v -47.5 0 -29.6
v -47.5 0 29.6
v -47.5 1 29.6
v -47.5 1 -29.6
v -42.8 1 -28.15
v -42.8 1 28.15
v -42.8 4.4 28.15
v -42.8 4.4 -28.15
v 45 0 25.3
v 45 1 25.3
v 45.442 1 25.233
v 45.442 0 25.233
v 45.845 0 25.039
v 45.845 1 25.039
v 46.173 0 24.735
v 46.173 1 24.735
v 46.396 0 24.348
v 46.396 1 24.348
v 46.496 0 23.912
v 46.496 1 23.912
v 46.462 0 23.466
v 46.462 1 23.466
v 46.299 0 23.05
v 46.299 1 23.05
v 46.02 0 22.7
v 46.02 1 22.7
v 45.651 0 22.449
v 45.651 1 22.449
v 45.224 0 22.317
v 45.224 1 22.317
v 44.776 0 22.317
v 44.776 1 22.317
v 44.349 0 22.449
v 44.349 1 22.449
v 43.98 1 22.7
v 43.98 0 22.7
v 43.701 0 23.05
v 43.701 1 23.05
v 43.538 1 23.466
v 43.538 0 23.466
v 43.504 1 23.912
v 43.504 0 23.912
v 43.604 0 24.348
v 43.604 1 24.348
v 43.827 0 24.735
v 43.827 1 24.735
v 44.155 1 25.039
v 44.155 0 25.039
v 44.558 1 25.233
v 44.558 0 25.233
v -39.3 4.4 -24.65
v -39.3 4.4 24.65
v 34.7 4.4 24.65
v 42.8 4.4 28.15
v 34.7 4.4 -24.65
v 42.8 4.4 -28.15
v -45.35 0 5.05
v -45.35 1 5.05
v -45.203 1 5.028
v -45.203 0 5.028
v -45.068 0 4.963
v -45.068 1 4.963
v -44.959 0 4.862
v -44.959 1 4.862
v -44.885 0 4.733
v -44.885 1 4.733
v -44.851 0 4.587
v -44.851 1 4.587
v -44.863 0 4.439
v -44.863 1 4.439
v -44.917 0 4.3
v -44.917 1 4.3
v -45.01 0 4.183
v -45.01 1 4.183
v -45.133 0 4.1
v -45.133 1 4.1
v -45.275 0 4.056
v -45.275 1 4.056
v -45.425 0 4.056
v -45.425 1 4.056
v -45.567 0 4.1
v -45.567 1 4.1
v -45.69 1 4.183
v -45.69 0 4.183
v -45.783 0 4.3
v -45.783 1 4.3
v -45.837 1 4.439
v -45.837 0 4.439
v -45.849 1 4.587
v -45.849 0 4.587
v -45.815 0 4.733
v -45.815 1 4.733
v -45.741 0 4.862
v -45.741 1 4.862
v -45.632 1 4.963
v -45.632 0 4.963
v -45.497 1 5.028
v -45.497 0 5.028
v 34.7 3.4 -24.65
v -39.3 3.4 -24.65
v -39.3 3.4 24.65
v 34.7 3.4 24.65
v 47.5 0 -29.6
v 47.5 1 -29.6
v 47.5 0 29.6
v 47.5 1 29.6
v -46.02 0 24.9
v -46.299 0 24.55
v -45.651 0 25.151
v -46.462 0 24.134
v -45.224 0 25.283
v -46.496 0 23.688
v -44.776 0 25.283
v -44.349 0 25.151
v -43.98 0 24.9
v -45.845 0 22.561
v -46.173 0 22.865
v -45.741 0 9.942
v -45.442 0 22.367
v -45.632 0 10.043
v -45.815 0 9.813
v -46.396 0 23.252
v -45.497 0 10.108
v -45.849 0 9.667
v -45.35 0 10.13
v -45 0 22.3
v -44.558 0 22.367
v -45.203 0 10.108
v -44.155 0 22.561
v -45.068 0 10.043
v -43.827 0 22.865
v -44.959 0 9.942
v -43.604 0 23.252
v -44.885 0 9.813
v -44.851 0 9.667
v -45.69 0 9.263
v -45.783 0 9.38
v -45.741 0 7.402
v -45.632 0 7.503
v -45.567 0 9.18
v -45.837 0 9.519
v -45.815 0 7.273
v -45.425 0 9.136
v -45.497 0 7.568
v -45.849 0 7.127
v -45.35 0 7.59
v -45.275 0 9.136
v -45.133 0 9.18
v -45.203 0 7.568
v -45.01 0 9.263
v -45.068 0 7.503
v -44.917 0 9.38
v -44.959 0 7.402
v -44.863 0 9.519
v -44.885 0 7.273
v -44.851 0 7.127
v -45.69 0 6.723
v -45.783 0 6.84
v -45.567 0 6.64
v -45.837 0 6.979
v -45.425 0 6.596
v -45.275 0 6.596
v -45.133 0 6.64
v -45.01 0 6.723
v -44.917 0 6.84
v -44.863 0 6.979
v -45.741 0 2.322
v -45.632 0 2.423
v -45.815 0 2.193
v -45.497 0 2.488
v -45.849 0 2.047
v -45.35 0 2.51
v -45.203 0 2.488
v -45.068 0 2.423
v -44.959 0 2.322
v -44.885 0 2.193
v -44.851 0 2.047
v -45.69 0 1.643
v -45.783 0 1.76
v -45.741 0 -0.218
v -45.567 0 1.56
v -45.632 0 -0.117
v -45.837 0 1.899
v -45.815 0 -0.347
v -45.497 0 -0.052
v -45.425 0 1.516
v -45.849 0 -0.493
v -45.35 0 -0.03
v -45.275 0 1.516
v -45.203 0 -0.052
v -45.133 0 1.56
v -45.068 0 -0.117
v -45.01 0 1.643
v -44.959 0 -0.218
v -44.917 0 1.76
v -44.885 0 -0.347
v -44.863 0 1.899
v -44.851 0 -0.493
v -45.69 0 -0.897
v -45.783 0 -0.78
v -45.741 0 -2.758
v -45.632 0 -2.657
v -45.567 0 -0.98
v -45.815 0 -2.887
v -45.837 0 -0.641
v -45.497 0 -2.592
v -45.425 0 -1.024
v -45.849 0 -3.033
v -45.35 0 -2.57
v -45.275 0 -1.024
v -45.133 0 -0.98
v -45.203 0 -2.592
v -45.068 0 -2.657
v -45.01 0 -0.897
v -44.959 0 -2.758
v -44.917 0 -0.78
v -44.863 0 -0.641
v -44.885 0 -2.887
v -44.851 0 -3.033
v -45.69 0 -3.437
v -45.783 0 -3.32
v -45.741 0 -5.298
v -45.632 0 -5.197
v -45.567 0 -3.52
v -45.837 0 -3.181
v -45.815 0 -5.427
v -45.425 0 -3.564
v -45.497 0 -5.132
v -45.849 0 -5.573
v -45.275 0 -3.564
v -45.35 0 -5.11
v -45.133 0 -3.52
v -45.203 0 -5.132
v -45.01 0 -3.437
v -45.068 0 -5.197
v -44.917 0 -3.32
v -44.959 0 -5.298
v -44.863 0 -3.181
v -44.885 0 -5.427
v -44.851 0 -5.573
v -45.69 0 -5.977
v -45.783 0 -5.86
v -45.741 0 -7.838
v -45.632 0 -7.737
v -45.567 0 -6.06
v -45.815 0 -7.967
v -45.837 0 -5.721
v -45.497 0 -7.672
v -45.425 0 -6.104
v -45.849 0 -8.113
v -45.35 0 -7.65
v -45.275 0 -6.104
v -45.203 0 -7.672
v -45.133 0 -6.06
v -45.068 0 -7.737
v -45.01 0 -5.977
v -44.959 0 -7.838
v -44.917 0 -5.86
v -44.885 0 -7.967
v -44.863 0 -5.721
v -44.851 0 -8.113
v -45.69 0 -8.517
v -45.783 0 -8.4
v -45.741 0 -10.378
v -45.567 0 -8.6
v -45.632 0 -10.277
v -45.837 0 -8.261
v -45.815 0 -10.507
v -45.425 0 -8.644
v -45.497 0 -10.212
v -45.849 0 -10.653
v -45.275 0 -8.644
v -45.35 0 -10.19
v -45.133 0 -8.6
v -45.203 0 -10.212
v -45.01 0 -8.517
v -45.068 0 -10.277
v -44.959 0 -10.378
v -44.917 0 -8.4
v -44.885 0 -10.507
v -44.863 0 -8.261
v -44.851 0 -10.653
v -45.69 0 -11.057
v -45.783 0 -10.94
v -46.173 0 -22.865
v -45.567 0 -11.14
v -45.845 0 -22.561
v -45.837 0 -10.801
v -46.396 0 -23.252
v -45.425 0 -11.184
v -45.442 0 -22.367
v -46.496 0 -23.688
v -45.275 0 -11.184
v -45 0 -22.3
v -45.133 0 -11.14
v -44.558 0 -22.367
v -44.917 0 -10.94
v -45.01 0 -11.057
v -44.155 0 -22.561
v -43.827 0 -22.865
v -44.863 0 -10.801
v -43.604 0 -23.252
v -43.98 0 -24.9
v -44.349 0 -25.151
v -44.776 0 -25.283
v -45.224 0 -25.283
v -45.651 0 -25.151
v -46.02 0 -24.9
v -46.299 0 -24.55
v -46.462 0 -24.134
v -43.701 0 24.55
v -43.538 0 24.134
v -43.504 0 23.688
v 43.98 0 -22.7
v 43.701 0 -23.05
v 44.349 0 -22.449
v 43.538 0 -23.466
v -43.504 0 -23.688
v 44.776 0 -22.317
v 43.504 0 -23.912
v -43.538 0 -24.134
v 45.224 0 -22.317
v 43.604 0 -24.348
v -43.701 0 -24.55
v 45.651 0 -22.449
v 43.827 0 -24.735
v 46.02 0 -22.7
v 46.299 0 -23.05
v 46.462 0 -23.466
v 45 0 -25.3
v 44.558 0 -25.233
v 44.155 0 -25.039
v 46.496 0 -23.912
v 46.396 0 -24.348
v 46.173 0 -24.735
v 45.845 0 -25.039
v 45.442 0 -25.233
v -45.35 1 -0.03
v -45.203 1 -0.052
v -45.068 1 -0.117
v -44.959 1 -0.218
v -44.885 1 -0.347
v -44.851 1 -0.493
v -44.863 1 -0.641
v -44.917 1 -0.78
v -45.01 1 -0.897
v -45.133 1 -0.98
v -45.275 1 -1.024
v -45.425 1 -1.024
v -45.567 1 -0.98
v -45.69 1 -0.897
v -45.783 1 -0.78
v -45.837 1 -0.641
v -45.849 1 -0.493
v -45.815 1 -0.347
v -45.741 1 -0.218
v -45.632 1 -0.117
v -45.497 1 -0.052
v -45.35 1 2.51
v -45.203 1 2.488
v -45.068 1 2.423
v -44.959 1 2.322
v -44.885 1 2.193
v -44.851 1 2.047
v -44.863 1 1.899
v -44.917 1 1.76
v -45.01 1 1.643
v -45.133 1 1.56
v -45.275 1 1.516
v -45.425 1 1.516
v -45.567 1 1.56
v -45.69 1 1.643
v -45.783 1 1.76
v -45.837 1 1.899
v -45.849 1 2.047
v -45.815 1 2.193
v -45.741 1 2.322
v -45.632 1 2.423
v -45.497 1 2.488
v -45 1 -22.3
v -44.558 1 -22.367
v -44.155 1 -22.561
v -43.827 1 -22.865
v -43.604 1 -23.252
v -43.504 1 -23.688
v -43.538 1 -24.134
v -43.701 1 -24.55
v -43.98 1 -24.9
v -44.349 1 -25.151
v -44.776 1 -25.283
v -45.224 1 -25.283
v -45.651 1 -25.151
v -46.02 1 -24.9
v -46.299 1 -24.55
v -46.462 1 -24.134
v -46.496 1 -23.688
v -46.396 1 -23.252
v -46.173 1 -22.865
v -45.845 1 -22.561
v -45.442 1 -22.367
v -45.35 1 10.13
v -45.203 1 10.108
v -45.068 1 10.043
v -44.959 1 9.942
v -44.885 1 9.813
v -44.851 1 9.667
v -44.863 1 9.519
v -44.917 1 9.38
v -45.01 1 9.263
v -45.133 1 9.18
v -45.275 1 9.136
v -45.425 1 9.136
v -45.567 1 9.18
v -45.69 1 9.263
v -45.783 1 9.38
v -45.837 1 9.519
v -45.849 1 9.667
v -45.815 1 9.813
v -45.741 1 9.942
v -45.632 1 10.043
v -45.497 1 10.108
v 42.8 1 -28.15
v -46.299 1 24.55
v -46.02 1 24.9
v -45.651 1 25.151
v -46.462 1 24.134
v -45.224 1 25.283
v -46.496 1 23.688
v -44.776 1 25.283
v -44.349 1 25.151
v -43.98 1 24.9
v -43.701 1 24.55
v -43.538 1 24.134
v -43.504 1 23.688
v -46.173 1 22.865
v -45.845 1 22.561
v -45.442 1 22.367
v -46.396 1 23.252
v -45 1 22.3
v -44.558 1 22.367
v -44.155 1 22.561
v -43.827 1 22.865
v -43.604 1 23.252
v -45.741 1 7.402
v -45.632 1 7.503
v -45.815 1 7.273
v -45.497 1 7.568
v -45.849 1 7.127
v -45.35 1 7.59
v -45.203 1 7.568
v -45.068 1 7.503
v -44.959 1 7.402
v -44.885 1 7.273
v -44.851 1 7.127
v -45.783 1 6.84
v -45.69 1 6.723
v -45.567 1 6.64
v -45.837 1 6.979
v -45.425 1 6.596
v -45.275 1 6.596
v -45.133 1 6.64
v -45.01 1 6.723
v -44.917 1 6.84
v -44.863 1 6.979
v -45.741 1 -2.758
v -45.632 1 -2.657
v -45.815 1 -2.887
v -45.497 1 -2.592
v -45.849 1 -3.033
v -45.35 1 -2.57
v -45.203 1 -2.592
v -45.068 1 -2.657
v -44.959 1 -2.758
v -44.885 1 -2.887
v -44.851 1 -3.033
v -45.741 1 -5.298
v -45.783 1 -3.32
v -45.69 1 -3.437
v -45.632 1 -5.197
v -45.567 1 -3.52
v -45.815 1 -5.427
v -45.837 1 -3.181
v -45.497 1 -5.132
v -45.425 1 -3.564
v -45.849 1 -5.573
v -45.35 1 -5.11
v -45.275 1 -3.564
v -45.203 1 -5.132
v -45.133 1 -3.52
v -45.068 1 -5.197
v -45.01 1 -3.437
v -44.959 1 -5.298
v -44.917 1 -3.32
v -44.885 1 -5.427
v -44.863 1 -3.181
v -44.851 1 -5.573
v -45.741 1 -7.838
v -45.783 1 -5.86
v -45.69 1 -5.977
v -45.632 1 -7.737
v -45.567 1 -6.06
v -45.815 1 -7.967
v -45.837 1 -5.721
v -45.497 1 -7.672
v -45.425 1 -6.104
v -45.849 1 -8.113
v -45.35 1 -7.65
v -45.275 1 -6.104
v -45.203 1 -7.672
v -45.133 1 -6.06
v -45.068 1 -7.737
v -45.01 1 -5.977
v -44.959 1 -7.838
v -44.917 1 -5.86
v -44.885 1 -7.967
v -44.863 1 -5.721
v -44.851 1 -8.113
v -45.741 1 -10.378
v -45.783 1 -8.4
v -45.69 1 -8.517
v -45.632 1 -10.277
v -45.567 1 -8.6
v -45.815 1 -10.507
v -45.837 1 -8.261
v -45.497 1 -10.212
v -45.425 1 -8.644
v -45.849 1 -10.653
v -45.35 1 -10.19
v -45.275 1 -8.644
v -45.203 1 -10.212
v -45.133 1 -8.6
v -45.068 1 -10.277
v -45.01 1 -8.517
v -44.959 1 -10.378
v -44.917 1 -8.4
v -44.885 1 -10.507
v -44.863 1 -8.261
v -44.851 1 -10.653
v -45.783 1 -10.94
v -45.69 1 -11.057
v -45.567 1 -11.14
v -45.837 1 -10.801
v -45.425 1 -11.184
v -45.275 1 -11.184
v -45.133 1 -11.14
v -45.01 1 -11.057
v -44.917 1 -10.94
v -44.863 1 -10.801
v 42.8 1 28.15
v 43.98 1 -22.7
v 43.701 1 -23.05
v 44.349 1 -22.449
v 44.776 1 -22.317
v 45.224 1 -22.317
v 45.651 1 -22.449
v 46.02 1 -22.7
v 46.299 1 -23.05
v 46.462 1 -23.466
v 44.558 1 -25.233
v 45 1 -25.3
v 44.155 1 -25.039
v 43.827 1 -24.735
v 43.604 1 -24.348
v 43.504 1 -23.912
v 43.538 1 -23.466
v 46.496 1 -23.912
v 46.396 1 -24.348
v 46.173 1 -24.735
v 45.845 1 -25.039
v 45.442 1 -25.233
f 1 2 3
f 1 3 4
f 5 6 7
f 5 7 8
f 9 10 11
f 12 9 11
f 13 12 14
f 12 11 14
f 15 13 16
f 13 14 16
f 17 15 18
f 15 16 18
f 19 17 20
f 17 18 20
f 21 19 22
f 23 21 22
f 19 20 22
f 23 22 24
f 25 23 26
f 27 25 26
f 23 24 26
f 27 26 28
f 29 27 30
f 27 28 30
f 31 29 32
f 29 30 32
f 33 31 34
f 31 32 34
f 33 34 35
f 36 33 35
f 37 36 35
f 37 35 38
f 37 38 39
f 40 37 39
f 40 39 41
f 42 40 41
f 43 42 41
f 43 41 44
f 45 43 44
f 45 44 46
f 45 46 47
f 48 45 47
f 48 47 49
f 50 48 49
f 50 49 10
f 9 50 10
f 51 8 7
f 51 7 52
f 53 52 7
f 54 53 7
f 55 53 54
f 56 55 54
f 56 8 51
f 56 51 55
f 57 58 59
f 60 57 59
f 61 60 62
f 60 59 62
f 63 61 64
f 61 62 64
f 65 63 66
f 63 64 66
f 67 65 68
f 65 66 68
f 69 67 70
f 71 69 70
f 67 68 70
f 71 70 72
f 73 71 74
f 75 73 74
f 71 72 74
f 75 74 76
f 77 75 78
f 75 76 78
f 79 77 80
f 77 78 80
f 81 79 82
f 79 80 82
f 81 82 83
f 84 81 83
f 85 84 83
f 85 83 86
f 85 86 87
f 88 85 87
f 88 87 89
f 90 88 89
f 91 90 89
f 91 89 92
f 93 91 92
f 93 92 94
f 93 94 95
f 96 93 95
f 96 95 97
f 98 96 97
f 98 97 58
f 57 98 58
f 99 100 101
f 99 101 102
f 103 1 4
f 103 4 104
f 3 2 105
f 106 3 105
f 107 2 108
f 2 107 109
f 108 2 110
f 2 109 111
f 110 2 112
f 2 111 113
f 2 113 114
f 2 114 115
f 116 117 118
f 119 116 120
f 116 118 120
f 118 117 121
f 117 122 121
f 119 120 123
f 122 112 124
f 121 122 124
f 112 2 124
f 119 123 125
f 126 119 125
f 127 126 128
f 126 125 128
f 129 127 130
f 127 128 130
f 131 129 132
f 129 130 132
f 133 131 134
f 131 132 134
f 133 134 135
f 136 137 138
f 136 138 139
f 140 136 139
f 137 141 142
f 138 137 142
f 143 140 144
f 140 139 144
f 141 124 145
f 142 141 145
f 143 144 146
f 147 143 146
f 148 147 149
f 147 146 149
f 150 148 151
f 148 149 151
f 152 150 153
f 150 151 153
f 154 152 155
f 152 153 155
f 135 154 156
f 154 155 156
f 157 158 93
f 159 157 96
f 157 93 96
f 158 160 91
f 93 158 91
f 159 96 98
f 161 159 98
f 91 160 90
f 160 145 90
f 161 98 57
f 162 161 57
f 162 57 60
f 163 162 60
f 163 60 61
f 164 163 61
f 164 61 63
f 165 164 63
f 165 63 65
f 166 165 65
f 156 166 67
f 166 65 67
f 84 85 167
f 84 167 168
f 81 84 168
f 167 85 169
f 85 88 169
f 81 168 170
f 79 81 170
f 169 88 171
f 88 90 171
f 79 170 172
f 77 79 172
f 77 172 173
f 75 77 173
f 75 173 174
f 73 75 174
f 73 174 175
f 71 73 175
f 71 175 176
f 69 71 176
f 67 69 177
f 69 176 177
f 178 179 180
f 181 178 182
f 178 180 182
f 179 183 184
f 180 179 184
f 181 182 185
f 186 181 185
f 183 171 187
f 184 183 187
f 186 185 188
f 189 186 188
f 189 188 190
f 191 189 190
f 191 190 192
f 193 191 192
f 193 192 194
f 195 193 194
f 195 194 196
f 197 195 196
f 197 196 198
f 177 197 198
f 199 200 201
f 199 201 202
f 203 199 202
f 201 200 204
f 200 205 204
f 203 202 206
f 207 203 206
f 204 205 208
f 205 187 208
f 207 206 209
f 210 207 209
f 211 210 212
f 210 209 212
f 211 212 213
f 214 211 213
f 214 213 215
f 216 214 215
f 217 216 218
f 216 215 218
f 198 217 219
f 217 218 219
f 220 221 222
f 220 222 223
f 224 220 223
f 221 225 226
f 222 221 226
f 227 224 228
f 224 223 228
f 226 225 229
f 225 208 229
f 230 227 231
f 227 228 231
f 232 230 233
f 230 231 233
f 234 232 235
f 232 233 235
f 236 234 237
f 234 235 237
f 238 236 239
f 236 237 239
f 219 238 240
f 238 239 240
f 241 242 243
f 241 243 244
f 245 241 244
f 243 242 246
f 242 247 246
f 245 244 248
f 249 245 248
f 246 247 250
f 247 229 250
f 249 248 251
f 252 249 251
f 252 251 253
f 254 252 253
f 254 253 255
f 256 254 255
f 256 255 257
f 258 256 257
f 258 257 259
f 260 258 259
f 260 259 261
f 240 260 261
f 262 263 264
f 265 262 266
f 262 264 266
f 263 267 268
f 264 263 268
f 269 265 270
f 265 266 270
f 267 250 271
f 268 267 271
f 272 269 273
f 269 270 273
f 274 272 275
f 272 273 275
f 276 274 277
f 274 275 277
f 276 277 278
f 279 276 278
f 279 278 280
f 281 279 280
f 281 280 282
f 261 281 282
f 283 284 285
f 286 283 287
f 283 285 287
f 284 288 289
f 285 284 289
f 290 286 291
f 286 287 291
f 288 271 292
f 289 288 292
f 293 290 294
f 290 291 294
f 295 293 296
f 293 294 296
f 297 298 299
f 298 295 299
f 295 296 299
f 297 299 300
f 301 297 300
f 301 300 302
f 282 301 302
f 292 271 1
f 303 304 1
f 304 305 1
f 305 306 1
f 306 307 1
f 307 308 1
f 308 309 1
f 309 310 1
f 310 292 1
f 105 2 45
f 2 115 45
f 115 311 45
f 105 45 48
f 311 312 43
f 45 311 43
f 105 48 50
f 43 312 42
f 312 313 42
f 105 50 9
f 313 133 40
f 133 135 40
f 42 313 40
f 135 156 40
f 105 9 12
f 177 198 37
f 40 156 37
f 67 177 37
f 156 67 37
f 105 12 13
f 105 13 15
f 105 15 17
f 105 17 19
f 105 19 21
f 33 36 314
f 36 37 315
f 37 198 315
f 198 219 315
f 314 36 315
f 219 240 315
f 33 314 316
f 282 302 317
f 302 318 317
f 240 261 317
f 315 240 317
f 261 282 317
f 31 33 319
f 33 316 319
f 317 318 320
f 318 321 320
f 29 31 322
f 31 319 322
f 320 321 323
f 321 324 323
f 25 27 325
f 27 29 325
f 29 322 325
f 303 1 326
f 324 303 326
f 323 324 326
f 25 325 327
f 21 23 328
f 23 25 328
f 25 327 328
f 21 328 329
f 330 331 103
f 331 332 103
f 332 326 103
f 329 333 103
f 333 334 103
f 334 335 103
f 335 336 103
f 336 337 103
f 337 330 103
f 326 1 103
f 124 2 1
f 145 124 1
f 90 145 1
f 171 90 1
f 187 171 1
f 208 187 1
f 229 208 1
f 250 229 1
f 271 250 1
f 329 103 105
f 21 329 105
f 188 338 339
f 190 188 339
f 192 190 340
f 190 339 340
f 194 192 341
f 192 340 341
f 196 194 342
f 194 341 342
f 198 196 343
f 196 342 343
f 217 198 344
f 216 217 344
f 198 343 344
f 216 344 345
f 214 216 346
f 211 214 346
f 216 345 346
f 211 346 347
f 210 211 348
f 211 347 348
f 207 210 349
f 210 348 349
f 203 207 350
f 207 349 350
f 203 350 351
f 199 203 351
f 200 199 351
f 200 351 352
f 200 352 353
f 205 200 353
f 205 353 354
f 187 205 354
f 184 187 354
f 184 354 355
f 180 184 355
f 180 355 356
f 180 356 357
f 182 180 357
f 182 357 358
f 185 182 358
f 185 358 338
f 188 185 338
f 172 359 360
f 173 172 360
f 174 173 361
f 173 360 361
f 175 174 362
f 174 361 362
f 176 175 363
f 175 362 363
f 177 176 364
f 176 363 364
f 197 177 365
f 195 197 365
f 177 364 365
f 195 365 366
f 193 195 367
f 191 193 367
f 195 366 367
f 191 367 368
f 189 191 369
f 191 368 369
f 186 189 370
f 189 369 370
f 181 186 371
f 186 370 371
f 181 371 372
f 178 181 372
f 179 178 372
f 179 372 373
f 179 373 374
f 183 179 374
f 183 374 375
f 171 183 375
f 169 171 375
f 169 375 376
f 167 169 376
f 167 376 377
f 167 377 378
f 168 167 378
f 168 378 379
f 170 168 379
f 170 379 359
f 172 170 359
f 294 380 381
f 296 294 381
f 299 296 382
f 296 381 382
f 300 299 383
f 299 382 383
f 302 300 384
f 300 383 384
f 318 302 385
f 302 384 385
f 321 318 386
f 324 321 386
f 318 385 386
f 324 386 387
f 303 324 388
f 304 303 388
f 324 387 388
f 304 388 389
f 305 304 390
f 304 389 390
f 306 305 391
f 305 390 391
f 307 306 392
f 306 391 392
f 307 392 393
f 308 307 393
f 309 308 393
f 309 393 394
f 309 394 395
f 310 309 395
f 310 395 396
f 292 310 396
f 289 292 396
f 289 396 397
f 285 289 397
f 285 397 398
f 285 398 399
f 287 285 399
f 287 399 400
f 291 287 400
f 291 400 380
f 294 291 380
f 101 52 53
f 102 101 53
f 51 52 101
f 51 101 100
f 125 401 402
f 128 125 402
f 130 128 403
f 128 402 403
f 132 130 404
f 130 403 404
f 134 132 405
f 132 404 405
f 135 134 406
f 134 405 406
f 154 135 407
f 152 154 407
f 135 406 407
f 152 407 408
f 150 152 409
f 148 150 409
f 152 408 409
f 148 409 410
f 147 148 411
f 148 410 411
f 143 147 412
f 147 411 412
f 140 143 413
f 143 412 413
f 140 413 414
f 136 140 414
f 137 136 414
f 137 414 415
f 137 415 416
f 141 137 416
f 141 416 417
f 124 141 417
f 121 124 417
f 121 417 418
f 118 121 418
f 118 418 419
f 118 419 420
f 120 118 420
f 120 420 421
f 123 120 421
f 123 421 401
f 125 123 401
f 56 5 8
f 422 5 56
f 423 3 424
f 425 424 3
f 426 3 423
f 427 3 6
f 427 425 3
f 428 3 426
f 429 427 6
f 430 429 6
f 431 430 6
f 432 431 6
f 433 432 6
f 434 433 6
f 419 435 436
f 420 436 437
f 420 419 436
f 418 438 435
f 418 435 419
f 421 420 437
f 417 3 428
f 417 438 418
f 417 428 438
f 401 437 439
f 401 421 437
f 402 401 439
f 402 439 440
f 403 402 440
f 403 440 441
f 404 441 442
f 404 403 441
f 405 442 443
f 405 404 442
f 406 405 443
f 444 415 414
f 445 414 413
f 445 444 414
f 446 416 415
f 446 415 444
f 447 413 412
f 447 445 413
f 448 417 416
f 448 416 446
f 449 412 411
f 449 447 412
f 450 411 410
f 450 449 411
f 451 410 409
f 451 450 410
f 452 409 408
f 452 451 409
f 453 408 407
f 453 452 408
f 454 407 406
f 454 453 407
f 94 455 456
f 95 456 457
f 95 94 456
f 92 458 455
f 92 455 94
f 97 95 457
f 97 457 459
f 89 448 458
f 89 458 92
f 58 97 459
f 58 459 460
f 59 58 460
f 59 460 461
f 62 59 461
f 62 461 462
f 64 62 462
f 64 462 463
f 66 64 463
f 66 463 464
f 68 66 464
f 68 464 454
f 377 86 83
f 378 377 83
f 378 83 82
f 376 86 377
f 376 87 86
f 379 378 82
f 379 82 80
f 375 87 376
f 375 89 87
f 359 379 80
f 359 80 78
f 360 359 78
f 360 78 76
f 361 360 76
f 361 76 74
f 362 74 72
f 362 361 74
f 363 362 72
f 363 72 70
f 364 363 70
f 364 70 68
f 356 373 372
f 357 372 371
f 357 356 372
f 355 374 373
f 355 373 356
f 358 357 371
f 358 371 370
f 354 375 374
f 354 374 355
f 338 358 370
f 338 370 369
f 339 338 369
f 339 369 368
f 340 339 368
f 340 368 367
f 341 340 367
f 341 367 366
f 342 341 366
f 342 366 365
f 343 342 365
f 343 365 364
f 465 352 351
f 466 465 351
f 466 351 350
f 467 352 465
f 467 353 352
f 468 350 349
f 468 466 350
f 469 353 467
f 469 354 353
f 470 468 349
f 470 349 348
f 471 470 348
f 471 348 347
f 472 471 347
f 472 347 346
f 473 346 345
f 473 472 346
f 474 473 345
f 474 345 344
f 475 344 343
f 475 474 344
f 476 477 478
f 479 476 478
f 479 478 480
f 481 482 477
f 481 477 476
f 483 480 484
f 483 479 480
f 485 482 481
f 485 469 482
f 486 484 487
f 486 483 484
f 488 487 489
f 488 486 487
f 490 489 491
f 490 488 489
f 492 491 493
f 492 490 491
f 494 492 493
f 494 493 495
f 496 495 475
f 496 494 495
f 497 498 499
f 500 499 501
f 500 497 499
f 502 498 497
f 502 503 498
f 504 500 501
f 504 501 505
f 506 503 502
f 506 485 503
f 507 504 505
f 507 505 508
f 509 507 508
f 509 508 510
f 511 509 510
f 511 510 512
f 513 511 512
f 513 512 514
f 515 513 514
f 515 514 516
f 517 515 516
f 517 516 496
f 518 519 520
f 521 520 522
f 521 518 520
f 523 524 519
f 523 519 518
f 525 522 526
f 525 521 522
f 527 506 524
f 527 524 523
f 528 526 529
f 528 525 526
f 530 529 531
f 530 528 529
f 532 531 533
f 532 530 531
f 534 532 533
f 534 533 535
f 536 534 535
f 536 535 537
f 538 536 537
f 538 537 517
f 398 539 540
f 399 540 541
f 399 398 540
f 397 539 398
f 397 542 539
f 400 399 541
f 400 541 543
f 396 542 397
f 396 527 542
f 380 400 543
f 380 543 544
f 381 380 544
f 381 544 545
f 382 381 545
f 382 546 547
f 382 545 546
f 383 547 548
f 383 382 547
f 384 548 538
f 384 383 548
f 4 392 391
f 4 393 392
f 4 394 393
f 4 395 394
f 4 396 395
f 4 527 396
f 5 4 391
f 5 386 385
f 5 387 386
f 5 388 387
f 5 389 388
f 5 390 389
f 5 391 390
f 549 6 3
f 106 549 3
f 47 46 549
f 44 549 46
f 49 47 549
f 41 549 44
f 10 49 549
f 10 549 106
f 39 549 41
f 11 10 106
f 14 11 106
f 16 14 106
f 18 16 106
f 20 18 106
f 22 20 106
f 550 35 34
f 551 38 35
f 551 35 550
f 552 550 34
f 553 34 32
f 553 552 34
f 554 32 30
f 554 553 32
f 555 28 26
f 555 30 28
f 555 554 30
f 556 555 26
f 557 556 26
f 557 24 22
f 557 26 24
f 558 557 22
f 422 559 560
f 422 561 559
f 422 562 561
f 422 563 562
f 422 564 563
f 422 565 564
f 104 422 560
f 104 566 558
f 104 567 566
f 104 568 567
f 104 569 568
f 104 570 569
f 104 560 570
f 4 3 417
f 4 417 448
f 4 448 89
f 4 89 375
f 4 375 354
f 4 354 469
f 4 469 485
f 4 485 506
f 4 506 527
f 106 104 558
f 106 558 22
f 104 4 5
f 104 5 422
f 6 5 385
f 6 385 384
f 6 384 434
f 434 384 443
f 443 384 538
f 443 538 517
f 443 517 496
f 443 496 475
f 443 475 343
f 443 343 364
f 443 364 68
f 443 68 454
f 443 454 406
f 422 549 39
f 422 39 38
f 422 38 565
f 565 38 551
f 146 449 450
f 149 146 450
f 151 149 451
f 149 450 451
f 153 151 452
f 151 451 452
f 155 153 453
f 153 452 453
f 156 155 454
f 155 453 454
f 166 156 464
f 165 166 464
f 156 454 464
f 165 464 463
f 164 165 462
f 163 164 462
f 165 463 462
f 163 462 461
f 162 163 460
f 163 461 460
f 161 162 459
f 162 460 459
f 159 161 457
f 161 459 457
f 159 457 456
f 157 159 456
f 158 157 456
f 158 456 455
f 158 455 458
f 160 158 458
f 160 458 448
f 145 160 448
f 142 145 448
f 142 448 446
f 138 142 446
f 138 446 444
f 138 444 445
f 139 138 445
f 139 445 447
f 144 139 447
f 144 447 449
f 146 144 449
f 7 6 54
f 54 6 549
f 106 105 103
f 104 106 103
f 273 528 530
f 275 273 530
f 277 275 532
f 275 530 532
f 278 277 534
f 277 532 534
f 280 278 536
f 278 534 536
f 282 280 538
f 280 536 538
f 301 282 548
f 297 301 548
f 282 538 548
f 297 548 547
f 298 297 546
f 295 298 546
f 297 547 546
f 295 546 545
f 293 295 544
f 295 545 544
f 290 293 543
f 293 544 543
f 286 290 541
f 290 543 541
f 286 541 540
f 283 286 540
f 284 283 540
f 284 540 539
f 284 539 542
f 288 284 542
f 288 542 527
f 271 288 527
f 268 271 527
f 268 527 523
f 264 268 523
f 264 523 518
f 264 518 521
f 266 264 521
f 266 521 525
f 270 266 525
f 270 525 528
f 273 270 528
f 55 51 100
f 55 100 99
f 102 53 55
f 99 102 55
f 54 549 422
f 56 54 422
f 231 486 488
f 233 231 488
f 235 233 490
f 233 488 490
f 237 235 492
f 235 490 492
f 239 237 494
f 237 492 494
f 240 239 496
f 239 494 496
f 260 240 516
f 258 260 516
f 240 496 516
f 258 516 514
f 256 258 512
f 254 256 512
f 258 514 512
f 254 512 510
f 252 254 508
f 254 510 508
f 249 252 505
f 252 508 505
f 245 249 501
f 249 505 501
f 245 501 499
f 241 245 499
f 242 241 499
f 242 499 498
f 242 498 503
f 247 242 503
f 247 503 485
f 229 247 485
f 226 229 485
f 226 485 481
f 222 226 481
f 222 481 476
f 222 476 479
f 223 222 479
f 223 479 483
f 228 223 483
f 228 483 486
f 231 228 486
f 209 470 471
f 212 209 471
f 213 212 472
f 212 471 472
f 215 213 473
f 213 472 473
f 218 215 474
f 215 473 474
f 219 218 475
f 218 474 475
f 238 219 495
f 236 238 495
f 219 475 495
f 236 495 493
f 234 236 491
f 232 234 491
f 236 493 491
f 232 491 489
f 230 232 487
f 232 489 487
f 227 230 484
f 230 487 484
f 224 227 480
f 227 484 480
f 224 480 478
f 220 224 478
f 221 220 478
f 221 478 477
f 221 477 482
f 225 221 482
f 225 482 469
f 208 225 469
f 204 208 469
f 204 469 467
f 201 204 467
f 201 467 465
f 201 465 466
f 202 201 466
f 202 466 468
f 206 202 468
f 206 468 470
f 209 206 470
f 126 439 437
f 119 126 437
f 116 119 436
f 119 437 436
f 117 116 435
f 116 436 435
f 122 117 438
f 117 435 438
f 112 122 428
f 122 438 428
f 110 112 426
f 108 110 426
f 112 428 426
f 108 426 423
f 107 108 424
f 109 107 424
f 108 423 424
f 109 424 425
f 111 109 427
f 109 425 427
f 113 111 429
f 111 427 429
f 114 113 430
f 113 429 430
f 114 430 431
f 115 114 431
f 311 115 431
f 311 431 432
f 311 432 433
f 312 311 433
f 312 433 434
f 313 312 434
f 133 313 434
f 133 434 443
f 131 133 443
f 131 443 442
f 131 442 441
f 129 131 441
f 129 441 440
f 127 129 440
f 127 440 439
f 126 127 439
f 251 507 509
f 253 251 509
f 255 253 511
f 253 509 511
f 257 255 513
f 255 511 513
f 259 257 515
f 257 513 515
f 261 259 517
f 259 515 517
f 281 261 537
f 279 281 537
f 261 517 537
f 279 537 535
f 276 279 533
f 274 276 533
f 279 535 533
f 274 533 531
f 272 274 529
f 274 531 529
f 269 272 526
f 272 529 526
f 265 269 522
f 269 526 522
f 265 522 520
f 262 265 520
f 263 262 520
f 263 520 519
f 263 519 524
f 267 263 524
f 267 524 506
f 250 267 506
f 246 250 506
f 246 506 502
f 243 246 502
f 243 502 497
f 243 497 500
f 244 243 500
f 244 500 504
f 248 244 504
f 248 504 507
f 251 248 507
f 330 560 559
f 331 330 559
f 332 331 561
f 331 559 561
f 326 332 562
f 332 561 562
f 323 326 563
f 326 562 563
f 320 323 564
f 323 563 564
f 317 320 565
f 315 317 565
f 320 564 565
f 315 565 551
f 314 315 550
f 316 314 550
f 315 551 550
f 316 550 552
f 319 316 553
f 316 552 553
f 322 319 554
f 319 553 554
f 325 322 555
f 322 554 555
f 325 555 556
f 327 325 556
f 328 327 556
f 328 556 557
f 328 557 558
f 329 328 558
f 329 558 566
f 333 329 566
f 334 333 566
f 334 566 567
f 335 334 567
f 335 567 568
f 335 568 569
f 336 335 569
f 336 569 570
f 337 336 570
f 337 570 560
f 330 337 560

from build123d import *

# Parameters (mm, degrees)
CROQUIS1_W              = 95
CROQUIS1_H              = 59.2
SALIENTE_EXTRUIR1_DEPTH = 1
CROQUIS2_W              = 85.6
CROQUIS2_H              = 56.3
SALIENTE_EXTRUIR2_DEPTH = 3.4
CROQUIS3_W              = 74
CROQUIS3_H              = 49.3
CORTAR_EXTRUIR1_DEPTH   = 1
CROQUIS4_R              = 1.5
CORTAR_EXTRUIR2_DEPTH   = 11
CROQUIS5_R              = 0.5
CORTAR_EXTRUIR3_DEPTH   = 10


with BuildPart() as part:
    # Croquis1 → Saliente-Extruir1 (new body)
    with BuildSketch(Plane(origin=(0, 0, 0), x_dir=(1, 0, 0), z_dir=(0, 1, 0))):
        Rectangle(CROQUIS1_W, CROQUIS1_H)
    extrude(amount=SALIENTE_EXTRUIR1_DEPTH)

    # Croquis2 → Saliente-Extruir2 (add)
    with BuildSketch(Plane(origin=(0, 1, 0), x_dir=(1, 0, 0), z_dir=(0, 1, 0))):
        Rectangle(CROQUIS2_W, CROQUIS2_H)
    extrude(amount=SALIENTE_EXTRUIR2_DEPTH)

    # Croquis3 → Cortar-Extruir1 (cut)
    with BuildSketch(Plane(origin=(0, 4.4, 0), x_dir=(1, 0, 0), z_dir=(0, 1, 0))):
        with Locations((-2.3, 0)):
            Rectangle(CROQUIS3_W, CROQUIS3_H)
    extrude(amount=-CORTAR_EXTRUIR1_DEPTH, mode=Mode.SUBTRACT)

    # Croquis4 → Cortar-Extruir2 (cut)
    with BuildSketch(Plane(origin=(0, 1, 0), x_dir=(1, 0, 0), z_dir=(0, 1, 0))):
        with Locations(Location((45, -23.8, 0), (0, 0, 270))):
            Circle(CROQUIS4_R)
        with Locations(Location((45, 23.8, 0), (0, 0, 90))):
            Circle(CROQUIS4_R)
        with Locations(Location((-45, -23.8, 0), (0, 0, 90))):
            Circle(CROQUIS4_R)
        with Locations(Location((-45, 23.8, 0), (0, 0, 270))):
            Circle(CROQUIS4_R)
    extrude(amount=-CORTAR_EXTRUIR2_DEPTH, mode=Mode.SUBTRACT)

    # Croquis5 → Cortar-Extruir3 (cut)
    with BuildSketch(Plane(origin=(0, 1, 0), x_dir=(1, 0, 0), z_dir=(0, 1, 0))):
        with Locations(Location((-45.35, -9.63, 0), (0, 0, 270))):
            Circle(CROQUIS5_R)
        with Locations(Location((-45.35, -7.09, 0), (0, 0, 270))):
            Circle(CROQUIS5_R)
        with Locations(Location((-45.35, -4.55, 0), (0, 0, 270))):
            Circle(CROQUIS5_R)
        with Locations(Location((-45.35, -2.01, 0), (0, 0, 270))):
            Circle(CROQUIS5_R)
        with Locations(Location((-45.35, 0.53, 0), (0, 0, 270))):
            Circle(CROQUIS5_R)
        with Locations(Location((-45.35, 3.07, 0), (0, 0, 270))):
            Circle(CROQUIS5_R)
        with Locations(Location((-45.35, 5.61, 0), (0, 0, 270))):
            Circle(CROQUIS5_R)
        with Locations(Location((-45.35, 8.15, 0), (0, 0, 270))):
            Circle(CROQUIS5_R)
        with Locations(Location((-45.35, 10.69, 0), (0, 0, 270))):
            Circle(CROQUIS5_R)
    extrude(amount=-CORTAR_EXTRUIR3_DEPTH, mode=Mode.SUBTRACT)


solid = part.part
